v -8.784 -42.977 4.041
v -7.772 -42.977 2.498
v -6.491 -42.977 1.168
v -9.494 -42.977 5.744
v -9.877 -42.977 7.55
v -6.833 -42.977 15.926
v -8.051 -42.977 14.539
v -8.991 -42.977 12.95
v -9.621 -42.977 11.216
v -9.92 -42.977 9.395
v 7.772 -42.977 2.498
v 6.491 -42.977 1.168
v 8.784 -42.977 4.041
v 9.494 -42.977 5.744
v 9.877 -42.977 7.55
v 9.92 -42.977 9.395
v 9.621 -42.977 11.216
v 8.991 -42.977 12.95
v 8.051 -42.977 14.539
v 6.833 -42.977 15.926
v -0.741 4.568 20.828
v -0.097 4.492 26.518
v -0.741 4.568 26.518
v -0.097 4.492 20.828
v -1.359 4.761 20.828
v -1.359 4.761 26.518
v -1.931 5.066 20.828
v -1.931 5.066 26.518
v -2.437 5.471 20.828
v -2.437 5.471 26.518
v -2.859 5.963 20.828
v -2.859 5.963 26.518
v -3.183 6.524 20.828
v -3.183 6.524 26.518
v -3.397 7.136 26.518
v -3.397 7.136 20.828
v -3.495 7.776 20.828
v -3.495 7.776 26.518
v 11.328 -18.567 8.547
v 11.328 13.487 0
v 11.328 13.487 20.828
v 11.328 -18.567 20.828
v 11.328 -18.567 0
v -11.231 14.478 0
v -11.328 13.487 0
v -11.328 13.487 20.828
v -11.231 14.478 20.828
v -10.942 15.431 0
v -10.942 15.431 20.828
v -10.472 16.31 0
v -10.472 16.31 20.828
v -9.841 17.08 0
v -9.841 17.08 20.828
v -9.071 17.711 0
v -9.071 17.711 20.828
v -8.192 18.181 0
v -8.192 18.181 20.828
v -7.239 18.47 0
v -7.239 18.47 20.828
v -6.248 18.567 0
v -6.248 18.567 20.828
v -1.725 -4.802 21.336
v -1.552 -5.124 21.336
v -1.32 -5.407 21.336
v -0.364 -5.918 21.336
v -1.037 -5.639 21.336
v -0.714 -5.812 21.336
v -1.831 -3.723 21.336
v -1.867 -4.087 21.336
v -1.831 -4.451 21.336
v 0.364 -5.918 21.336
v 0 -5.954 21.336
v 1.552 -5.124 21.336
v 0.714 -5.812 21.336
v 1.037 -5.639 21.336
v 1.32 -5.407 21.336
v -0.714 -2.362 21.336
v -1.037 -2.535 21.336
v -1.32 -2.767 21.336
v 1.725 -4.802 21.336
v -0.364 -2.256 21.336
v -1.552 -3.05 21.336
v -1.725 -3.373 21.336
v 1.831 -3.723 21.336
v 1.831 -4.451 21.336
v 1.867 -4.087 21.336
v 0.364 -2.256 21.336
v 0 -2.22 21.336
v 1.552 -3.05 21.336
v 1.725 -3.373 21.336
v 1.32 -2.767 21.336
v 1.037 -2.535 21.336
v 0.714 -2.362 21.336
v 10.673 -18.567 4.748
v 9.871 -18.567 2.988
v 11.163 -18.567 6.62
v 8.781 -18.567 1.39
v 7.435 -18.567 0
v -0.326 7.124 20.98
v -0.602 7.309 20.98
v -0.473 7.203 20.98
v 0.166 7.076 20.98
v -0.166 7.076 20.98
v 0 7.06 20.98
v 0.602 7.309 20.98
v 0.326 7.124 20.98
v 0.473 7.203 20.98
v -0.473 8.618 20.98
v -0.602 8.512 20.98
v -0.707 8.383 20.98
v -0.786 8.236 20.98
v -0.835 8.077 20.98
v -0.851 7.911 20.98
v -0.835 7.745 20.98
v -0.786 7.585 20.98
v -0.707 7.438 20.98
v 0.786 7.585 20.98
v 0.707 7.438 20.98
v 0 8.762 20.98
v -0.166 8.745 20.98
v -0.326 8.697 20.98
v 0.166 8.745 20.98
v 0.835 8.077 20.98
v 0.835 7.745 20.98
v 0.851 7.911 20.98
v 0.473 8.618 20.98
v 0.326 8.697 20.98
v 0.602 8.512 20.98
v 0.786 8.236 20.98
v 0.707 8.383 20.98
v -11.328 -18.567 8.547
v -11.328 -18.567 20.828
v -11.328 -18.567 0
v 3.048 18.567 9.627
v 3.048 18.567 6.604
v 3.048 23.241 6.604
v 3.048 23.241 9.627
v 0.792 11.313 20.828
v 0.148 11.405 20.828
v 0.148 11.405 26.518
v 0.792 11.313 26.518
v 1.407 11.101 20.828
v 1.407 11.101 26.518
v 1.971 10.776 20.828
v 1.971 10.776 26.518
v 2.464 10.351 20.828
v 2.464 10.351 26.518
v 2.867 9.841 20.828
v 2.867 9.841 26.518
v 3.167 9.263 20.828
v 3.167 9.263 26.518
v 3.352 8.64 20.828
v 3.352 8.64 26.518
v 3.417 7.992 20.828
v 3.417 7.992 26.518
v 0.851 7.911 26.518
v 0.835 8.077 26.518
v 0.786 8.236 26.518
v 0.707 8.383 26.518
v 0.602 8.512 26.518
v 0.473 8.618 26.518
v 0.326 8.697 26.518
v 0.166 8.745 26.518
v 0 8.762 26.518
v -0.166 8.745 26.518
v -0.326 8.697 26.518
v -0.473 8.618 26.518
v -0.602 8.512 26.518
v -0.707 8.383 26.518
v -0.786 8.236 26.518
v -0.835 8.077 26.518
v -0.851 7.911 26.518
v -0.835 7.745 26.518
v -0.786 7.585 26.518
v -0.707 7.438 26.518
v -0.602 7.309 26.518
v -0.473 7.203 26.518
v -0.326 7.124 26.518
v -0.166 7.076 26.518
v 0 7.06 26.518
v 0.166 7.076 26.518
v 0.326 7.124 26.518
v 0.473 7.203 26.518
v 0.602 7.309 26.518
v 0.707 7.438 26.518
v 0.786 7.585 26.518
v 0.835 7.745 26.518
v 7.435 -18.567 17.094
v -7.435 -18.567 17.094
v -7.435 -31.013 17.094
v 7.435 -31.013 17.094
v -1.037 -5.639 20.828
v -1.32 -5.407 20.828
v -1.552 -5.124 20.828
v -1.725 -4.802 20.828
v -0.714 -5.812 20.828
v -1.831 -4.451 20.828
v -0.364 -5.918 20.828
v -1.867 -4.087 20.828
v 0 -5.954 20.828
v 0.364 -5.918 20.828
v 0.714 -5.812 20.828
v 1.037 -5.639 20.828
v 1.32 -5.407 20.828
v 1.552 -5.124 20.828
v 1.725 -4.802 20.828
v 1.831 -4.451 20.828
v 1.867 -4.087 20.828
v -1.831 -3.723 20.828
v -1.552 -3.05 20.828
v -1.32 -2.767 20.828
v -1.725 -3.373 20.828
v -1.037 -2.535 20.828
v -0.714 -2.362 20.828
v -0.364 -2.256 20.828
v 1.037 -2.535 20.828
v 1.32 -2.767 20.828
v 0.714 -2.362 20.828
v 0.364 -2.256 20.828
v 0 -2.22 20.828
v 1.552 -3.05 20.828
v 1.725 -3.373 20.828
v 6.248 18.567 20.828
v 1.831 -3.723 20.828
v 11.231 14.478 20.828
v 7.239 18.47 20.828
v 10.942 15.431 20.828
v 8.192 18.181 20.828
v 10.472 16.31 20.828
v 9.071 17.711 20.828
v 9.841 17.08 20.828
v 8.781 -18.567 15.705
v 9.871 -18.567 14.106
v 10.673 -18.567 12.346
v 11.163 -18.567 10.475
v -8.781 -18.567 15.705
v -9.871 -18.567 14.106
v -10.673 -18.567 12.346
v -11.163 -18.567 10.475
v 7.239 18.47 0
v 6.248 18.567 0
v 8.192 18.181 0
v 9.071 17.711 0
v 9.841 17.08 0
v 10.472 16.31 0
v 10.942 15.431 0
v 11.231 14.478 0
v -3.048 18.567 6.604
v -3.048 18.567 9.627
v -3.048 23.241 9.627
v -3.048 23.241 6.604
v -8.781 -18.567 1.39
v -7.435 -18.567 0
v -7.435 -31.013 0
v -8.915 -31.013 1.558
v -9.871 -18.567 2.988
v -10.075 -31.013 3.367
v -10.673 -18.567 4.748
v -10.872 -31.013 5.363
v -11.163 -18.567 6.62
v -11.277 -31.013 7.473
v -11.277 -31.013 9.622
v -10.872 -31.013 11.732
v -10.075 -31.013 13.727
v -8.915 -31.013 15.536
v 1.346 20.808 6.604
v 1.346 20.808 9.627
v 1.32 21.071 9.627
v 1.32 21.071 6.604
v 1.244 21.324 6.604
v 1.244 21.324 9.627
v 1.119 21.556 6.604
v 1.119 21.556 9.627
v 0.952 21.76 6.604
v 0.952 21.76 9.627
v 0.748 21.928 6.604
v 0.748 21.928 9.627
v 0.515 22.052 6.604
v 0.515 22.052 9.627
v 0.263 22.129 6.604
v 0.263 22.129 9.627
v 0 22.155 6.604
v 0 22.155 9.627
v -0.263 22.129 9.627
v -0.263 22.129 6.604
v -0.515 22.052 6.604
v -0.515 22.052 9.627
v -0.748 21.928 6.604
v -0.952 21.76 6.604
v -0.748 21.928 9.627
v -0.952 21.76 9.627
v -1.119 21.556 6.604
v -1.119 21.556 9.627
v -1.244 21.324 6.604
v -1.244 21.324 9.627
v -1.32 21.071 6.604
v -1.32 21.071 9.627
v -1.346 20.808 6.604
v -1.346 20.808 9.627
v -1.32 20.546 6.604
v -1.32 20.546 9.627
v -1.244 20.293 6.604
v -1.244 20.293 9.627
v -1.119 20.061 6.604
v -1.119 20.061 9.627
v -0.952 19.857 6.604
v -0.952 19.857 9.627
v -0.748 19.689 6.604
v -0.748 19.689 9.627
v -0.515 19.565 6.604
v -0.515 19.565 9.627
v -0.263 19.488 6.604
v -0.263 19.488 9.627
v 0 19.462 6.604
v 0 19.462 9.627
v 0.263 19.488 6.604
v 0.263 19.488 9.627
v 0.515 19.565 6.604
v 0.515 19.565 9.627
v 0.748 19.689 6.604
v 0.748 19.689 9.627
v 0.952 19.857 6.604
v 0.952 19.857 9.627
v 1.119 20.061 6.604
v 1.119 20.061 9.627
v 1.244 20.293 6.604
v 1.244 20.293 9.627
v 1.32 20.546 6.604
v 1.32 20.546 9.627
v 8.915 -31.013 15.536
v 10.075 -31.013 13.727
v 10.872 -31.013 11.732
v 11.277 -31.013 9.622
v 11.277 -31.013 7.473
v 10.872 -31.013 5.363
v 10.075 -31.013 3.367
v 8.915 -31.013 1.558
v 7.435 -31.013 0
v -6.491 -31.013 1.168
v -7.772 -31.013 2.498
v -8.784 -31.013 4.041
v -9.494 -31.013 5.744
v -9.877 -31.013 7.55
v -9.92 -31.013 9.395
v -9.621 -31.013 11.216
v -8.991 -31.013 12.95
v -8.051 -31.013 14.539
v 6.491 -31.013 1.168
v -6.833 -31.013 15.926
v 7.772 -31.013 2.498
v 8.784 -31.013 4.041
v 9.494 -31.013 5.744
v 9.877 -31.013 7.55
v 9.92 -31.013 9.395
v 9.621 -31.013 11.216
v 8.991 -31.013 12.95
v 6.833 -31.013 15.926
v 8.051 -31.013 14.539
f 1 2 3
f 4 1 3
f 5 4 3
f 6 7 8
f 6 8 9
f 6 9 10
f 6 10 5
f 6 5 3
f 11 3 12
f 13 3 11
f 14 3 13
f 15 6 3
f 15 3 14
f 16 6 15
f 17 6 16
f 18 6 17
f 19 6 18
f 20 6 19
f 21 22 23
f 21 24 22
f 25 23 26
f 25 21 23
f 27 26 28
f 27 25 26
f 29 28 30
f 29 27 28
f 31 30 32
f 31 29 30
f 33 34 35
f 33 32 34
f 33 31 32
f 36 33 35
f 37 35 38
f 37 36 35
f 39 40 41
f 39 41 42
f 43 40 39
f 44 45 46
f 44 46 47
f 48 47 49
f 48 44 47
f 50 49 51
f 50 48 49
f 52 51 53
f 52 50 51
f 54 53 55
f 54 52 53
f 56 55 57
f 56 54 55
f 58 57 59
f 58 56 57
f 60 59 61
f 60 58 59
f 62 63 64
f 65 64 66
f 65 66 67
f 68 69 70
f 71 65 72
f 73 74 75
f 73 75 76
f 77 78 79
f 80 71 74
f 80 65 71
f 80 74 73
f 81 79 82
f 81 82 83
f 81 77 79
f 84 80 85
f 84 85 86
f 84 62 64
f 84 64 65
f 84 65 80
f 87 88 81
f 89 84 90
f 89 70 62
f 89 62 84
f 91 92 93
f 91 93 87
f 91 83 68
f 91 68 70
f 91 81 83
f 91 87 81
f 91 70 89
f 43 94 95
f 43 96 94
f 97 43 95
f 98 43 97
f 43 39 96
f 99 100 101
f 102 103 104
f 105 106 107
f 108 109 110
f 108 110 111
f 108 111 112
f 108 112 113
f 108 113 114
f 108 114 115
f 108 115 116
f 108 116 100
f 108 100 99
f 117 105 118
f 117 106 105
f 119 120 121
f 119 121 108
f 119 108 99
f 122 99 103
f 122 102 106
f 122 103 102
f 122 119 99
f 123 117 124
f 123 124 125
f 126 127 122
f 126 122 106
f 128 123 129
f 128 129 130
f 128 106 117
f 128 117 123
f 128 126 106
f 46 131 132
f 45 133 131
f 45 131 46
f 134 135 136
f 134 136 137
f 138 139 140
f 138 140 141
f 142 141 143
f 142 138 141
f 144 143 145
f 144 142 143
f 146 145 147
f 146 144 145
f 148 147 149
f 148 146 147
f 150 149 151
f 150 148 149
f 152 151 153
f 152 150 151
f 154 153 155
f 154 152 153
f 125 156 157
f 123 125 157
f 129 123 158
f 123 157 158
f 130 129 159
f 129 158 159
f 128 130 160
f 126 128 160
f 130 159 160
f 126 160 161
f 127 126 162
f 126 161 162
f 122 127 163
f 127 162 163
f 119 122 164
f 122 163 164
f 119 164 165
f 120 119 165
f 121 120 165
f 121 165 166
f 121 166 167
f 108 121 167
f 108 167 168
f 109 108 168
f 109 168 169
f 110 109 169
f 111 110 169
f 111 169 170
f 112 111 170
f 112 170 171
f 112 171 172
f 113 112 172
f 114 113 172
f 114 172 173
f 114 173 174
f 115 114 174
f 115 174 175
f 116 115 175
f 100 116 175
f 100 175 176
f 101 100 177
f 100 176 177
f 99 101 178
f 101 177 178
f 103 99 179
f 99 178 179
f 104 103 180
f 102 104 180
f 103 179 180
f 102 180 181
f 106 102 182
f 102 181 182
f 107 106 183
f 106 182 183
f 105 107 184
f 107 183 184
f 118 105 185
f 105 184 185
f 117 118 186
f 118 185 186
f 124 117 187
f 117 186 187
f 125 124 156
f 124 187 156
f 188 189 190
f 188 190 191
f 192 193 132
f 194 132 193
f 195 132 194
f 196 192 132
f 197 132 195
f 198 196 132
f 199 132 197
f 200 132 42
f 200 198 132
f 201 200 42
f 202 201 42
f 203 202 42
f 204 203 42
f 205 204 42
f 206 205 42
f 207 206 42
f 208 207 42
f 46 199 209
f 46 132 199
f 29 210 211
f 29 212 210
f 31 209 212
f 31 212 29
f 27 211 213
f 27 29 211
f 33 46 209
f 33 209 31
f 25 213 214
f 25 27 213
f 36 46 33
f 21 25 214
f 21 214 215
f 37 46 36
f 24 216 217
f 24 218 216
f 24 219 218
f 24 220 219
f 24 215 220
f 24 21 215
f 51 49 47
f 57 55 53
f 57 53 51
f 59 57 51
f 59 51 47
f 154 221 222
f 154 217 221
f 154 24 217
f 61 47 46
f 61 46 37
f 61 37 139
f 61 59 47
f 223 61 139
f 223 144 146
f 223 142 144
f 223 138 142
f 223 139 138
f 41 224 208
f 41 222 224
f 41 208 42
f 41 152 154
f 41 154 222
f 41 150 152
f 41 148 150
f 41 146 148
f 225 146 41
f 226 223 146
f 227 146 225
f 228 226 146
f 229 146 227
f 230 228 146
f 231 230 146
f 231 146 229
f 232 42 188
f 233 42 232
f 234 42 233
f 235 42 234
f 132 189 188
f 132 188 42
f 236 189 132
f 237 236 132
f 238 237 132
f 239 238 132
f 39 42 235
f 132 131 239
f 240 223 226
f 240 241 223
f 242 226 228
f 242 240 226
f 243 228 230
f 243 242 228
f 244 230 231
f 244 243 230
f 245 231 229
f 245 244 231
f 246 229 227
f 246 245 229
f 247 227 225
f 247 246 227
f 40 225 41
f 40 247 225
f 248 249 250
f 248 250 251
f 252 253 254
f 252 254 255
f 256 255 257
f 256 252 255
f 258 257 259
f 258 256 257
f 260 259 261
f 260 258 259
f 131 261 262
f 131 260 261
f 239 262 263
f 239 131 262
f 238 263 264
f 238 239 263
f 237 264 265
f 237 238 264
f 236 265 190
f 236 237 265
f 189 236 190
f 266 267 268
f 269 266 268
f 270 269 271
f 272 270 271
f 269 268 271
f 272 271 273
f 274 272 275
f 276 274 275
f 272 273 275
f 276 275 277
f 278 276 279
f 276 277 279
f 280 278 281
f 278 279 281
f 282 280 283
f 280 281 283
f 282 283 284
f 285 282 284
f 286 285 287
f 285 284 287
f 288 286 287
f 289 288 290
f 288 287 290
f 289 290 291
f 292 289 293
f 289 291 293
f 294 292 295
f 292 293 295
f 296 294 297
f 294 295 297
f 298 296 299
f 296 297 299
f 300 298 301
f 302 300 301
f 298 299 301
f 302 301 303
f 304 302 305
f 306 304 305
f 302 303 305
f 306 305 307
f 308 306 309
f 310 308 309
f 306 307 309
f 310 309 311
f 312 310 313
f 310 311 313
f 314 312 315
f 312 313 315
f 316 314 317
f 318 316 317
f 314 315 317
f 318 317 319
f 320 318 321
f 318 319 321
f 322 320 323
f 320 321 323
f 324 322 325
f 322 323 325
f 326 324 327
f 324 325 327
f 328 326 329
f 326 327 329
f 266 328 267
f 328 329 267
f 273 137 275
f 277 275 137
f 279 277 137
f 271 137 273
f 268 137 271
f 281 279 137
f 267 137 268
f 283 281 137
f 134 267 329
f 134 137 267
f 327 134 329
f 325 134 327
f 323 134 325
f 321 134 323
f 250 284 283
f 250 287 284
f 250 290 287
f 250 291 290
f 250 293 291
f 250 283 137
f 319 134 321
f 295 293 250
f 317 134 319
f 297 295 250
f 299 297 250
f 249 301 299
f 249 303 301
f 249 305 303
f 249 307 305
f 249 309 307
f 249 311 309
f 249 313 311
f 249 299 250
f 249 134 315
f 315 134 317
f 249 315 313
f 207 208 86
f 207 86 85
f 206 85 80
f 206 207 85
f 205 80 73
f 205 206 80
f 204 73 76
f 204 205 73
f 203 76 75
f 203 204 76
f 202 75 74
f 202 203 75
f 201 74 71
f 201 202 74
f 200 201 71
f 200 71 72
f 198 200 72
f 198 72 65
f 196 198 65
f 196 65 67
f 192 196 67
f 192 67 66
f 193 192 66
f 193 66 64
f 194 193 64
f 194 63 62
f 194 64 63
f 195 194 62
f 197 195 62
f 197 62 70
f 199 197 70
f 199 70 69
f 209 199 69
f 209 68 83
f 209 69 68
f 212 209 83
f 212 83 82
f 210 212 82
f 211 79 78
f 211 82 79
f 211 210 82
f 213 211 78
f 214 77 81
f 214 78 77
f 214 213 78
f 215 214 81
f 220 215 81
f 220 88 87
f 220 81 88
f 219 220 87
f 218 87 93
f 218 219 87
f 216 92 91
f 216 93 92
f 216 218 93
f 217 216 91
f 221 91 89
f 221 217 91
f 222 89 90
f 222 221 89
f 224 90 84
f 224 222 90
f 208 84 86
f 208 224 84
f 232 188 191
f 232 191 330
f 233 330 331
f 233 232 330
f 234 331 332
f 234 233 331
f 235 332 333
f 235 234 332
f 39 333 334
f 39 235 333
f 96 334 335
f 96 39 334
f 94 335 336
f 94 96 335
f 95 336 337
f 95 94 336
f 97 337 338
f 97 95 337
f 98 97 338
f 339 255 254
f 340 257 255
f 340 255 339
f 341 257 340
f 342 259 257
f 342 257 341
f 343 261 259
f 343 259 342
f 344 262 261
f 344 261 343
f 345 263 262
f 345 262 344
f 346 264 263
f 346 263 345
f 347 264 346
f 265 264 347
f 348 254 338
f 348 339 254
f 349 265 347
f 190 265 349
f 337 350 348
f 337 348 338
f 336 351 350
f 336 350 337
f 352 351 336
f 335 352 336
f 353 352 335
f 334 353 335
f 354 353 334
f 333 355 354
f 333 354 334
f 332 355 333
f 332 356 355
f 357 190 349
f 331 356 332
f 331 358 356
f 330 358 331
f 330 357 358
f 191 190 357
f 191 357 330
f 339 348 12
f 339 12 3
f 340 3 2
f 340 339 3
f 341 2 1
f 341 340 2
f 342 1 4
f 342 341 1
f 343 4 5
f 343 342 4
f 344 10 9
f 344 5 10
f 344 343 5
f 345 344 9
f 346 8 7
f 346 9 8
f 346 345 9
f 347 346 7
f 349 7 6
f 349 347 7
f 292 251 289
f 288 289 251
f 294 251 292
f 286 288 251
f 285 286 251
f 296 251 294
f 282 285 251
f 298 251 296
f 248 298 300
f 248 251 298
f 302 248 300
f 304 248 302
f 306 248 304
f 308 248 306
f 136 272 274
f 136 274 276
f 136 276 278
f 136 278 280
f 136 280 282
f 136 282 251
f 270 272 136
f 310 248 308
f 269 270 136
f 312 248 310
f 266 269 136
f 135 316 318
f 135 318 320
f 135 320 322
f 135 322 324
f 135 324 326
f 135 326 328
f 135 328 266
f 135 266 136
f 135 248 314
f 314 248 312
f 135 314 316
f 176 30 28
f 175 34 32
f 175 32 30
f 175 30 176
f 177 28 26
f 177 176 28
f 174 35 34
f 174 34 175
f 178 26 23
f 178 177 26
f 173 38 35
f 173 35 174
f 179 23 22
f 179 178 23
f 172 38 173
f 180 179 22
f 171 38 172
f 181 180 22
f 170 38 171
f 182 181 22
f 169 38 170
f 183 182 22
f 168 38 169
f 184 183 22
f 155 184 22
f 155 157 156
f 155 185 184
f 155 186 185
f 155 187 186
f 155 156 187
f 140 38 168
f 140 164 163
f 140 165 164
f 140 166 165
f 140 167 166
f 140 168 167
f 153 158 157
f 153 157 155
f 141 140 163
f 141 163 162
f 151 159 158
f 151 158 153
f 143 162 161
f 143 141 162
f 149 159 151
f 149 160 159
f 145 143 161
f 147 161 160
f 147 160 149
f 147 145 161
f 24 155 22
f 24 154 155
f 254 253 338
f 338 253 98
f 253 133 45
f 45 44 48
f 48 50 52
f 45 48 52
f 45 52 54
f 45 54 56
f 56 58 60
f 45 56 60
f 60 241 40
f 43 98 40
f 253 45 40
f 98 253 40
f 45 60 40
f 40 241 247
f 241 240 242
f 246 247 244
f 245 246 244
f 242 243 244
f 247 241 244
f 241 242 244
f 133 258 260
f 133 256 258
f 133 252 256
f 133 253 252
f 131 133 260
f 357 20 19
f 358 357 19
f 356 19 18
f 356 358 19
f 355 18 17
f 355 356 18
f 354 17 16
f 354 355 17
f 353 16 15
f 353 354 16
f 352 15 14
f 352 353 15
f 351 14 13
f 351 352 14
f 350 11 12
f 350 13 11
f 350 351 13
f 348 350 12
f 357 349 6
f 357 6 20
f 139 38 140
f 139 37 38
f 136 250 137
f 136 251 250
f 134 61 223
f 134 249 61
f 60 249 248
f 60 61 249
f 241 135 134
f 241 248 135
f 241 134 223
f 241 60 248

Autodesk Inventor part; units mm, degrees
ref_plane "YZ Plane" through (0, 0, 0) normal (1, 0, 0) x (0, 1, 0)
ref_plane "XZ Plane" through (0, 0, 0) normal (0, 1, 0) x (-1, 0, 0)
ref_plane "XY Plane" through (0, 0, 0) normal (0, 0, 1) x (1, 0, 0)
sketch "Sketch1" plane through (0, 0, 0) normal (0, 0, 1) x (1, 0, 0)
  line L0 (-6.2484, 18.5674) -> (6.2484, 18.5674)
  line L1 (11.3284, 13.4874) -> (11.3284, -18.5674)
  line L2 (11.3284, -18.5674) -> (-11.3284, -18.5674)
  line L3 (-11.3284, -18.5674) -> (-11.3284, 13.4874)
  line L4 (-11.3284, 18.5674) -> (11.3284, -18.5674) construction
  line L5 (11.3284, 18.5674) -> (-11.3284, -18.5674) construction
  arc A0 (-6.2484, 18.5674) -> (-11.3284, 13.4874) centre (-6.2484, 13.4874) ccw
  arc A1 (11.3284, 13.4874) -> (6.2484, 18.5674) centre (6.2484, 13.4874) ccw
  point P0 (0, 0)
  dimension "d1" = 37.1348
  dimension "d2" = 5.08
  dimension "d45" = 22.6568
extrude "Extrusion1" add sketch "Sketch1" along normal blind 20.828
sketch "Sketch2" plane through (0, 0, 20.828) normal (0, 0, 1) x (1, 0, 0)
  line L0 (-3.4946, 7.7761) -> (0.1481, 11.4046)
  line L1 (3.4167, 7.9922) -> (-0.097, 4.4922)
  line L2 (6.2484, 18.5674) -> (-6.2484, 18.5674) projected
  arc A0 (3.4167, 7.9922) -> (0.1481, 11.4046) centre (-0.0127, 7.9789) ccw
  arc A1 (-3.4946, 7.7761) -> (-0.097, 4.4922) centre (-0.0127, 7.9789) ccw
  point P0 (0, 0)
  dimension "d9" = 7.1628
  dimension "d11" = 4.7244
extrude "Extrusion2" add sketch "Sketch2" along normal blind 5.6896
sketch "Sketch3" plane through (0, 0, 26.5176) normal (0, 0, 1) x (1, 0, 0)
  circle A0 centre (0, 7.9106) radius 0.8509
  point P0 (0, 0)
  dimension "d14" = 1.7018
extrude "Extrusion3" cut sketch "Sketch3" against normal blind 5.5372
sketch "Sketch4" plane through (-6.2484, 18.5674, 0) normal (0, 1, 0) x (1, 0, 0)
  line L0 (3.2004, -6.604) -> (9.2964, -6.604)
  line L1 (9.2964, -6.604) -> (9.2964, -9.6266)
  line L2 (9.2964, -9.6266) -> (3.2004, -9.6266)
  line L3 (3.2004, -9.6266) -> (3.2004, -6.604)
  line L4 (3.2004, -6.604) -> (9.2964, -9.6266) construction
  line L5 (9.2964, -6.604) -> (3.2004, -9.6266) construction
  line L6 (12.4968, 0) -> (0, 0) projected
  point P0 (6.2484, 0)
  point P1 (6.2484, -8.1153)
  point P2 (6.2484, -8.1153)
  point P3 (6.2484, 0)
  dimension "d17" = 6.096
  dimension "d18" = 3.0226
  dimension "d19" = 6.604
extrude "Extrusion4" add sketch "Sketch4" along normal blind 4.6736
sketch "Sketch5" plane through (-3.048, 18.5674, 9.6266) normal (0, 0, 1) x (1, 0, 0)
  circle A0 centre (3.048, 2.2411) radius 1.3462
  point P0 (3.048, -18.5674)
  dimension "d22" = 2.6924
extrude "Extrusion5" cut sketch "Sketch5" against normal blind 4.6736 and the other way blind 2.3368
sketch "Sketch6" plane through (0, 0, 20.828) normal (0, 0, 1) x (1, 0, 0)
  circle A0 centre (0, -4.0871) radius 1.8669
  line L0 (-0.097, 4.4922) -> (3.4167, 7.9922) projected
  point P0 (0, 0)
  dimension "d27" = 3.7338
  dimension "d28" = 6.1468
extrude "Extrusion6" add sketch "Sketch6" along normal blind 0.508
sketch "Sketch8" plane through (-11.3284, -18.5674, 0) normal (0, -1, 0) x (1, 0, 0)
  line L0 (0, 0) -> (22.6568, 0) projected
  line L1 (3.8934, 17.0942) -> (18.7634, 17.0942)
  line L2 (22.6568, 17.0942) -> (22.6568, 0)
  line L3 (22.6568, 0) -> (0, 0)
  line L4 (0, 0) -> (0, 17.0942)
  line L5 (0, 20.828) -> (22.6568, 20.828) projected
  line L6 (22.6568, 0) -> (22.6568, 20.828) projected
  arc A0 (18.7634, 0) -> (18.7634, 17.0942) centre (11.3284, 8.5471) ccw
  arc A1 (3.8934, 17.0942) -> (3.8934, 0) centre (11.3284, 8.5471) ccw
  point P0 (11.3284, 0)
  point P1 (11.3284, 8.5471)
  point P2 (11.3284, 20.828)
extrude "Extrusion8" add sketch "Sketch8" along normal blind 12.446 contours A1 L1 A0 L0
sketch "Sketch9" plane through (-11.3284, -31.0134, 0) normal (0, -1, 0) x (1, 0, 0)
  line L0 (4.4951, 15.9258) -> (18.1617, 15.9258)
  line L1 (17.8198, 1.1684) -> (4.837, 1.1684)
  arc A0 (4.4951, 15.9258) -> (4.837, 1.1684) centre (11.3284, 8.7014) ccw
  arc A1 (17.8198, 1.1684) -> (18.1617, 15.9258) centre (11.3284, 8.7014) ccw
  line L2 (18.7634, 17.0942) -> (3.8934, 17.0942) projected
  line L3 (3.8934, 0) -> (18.7634, 0) projected
  point P0 (11.3284, 0)
  point P1 (11.3284, 8.7014)
  point P2 (11.3284, 8.7014)
  point P3 (11.3284, 8.7014)
  dimension "d53" = 1.1684
  dimension "d54" = 1.1684
extrude "Extrusion9" add sketch "Sketch9" along normal blind 11.9634
properties part number "Motor"
